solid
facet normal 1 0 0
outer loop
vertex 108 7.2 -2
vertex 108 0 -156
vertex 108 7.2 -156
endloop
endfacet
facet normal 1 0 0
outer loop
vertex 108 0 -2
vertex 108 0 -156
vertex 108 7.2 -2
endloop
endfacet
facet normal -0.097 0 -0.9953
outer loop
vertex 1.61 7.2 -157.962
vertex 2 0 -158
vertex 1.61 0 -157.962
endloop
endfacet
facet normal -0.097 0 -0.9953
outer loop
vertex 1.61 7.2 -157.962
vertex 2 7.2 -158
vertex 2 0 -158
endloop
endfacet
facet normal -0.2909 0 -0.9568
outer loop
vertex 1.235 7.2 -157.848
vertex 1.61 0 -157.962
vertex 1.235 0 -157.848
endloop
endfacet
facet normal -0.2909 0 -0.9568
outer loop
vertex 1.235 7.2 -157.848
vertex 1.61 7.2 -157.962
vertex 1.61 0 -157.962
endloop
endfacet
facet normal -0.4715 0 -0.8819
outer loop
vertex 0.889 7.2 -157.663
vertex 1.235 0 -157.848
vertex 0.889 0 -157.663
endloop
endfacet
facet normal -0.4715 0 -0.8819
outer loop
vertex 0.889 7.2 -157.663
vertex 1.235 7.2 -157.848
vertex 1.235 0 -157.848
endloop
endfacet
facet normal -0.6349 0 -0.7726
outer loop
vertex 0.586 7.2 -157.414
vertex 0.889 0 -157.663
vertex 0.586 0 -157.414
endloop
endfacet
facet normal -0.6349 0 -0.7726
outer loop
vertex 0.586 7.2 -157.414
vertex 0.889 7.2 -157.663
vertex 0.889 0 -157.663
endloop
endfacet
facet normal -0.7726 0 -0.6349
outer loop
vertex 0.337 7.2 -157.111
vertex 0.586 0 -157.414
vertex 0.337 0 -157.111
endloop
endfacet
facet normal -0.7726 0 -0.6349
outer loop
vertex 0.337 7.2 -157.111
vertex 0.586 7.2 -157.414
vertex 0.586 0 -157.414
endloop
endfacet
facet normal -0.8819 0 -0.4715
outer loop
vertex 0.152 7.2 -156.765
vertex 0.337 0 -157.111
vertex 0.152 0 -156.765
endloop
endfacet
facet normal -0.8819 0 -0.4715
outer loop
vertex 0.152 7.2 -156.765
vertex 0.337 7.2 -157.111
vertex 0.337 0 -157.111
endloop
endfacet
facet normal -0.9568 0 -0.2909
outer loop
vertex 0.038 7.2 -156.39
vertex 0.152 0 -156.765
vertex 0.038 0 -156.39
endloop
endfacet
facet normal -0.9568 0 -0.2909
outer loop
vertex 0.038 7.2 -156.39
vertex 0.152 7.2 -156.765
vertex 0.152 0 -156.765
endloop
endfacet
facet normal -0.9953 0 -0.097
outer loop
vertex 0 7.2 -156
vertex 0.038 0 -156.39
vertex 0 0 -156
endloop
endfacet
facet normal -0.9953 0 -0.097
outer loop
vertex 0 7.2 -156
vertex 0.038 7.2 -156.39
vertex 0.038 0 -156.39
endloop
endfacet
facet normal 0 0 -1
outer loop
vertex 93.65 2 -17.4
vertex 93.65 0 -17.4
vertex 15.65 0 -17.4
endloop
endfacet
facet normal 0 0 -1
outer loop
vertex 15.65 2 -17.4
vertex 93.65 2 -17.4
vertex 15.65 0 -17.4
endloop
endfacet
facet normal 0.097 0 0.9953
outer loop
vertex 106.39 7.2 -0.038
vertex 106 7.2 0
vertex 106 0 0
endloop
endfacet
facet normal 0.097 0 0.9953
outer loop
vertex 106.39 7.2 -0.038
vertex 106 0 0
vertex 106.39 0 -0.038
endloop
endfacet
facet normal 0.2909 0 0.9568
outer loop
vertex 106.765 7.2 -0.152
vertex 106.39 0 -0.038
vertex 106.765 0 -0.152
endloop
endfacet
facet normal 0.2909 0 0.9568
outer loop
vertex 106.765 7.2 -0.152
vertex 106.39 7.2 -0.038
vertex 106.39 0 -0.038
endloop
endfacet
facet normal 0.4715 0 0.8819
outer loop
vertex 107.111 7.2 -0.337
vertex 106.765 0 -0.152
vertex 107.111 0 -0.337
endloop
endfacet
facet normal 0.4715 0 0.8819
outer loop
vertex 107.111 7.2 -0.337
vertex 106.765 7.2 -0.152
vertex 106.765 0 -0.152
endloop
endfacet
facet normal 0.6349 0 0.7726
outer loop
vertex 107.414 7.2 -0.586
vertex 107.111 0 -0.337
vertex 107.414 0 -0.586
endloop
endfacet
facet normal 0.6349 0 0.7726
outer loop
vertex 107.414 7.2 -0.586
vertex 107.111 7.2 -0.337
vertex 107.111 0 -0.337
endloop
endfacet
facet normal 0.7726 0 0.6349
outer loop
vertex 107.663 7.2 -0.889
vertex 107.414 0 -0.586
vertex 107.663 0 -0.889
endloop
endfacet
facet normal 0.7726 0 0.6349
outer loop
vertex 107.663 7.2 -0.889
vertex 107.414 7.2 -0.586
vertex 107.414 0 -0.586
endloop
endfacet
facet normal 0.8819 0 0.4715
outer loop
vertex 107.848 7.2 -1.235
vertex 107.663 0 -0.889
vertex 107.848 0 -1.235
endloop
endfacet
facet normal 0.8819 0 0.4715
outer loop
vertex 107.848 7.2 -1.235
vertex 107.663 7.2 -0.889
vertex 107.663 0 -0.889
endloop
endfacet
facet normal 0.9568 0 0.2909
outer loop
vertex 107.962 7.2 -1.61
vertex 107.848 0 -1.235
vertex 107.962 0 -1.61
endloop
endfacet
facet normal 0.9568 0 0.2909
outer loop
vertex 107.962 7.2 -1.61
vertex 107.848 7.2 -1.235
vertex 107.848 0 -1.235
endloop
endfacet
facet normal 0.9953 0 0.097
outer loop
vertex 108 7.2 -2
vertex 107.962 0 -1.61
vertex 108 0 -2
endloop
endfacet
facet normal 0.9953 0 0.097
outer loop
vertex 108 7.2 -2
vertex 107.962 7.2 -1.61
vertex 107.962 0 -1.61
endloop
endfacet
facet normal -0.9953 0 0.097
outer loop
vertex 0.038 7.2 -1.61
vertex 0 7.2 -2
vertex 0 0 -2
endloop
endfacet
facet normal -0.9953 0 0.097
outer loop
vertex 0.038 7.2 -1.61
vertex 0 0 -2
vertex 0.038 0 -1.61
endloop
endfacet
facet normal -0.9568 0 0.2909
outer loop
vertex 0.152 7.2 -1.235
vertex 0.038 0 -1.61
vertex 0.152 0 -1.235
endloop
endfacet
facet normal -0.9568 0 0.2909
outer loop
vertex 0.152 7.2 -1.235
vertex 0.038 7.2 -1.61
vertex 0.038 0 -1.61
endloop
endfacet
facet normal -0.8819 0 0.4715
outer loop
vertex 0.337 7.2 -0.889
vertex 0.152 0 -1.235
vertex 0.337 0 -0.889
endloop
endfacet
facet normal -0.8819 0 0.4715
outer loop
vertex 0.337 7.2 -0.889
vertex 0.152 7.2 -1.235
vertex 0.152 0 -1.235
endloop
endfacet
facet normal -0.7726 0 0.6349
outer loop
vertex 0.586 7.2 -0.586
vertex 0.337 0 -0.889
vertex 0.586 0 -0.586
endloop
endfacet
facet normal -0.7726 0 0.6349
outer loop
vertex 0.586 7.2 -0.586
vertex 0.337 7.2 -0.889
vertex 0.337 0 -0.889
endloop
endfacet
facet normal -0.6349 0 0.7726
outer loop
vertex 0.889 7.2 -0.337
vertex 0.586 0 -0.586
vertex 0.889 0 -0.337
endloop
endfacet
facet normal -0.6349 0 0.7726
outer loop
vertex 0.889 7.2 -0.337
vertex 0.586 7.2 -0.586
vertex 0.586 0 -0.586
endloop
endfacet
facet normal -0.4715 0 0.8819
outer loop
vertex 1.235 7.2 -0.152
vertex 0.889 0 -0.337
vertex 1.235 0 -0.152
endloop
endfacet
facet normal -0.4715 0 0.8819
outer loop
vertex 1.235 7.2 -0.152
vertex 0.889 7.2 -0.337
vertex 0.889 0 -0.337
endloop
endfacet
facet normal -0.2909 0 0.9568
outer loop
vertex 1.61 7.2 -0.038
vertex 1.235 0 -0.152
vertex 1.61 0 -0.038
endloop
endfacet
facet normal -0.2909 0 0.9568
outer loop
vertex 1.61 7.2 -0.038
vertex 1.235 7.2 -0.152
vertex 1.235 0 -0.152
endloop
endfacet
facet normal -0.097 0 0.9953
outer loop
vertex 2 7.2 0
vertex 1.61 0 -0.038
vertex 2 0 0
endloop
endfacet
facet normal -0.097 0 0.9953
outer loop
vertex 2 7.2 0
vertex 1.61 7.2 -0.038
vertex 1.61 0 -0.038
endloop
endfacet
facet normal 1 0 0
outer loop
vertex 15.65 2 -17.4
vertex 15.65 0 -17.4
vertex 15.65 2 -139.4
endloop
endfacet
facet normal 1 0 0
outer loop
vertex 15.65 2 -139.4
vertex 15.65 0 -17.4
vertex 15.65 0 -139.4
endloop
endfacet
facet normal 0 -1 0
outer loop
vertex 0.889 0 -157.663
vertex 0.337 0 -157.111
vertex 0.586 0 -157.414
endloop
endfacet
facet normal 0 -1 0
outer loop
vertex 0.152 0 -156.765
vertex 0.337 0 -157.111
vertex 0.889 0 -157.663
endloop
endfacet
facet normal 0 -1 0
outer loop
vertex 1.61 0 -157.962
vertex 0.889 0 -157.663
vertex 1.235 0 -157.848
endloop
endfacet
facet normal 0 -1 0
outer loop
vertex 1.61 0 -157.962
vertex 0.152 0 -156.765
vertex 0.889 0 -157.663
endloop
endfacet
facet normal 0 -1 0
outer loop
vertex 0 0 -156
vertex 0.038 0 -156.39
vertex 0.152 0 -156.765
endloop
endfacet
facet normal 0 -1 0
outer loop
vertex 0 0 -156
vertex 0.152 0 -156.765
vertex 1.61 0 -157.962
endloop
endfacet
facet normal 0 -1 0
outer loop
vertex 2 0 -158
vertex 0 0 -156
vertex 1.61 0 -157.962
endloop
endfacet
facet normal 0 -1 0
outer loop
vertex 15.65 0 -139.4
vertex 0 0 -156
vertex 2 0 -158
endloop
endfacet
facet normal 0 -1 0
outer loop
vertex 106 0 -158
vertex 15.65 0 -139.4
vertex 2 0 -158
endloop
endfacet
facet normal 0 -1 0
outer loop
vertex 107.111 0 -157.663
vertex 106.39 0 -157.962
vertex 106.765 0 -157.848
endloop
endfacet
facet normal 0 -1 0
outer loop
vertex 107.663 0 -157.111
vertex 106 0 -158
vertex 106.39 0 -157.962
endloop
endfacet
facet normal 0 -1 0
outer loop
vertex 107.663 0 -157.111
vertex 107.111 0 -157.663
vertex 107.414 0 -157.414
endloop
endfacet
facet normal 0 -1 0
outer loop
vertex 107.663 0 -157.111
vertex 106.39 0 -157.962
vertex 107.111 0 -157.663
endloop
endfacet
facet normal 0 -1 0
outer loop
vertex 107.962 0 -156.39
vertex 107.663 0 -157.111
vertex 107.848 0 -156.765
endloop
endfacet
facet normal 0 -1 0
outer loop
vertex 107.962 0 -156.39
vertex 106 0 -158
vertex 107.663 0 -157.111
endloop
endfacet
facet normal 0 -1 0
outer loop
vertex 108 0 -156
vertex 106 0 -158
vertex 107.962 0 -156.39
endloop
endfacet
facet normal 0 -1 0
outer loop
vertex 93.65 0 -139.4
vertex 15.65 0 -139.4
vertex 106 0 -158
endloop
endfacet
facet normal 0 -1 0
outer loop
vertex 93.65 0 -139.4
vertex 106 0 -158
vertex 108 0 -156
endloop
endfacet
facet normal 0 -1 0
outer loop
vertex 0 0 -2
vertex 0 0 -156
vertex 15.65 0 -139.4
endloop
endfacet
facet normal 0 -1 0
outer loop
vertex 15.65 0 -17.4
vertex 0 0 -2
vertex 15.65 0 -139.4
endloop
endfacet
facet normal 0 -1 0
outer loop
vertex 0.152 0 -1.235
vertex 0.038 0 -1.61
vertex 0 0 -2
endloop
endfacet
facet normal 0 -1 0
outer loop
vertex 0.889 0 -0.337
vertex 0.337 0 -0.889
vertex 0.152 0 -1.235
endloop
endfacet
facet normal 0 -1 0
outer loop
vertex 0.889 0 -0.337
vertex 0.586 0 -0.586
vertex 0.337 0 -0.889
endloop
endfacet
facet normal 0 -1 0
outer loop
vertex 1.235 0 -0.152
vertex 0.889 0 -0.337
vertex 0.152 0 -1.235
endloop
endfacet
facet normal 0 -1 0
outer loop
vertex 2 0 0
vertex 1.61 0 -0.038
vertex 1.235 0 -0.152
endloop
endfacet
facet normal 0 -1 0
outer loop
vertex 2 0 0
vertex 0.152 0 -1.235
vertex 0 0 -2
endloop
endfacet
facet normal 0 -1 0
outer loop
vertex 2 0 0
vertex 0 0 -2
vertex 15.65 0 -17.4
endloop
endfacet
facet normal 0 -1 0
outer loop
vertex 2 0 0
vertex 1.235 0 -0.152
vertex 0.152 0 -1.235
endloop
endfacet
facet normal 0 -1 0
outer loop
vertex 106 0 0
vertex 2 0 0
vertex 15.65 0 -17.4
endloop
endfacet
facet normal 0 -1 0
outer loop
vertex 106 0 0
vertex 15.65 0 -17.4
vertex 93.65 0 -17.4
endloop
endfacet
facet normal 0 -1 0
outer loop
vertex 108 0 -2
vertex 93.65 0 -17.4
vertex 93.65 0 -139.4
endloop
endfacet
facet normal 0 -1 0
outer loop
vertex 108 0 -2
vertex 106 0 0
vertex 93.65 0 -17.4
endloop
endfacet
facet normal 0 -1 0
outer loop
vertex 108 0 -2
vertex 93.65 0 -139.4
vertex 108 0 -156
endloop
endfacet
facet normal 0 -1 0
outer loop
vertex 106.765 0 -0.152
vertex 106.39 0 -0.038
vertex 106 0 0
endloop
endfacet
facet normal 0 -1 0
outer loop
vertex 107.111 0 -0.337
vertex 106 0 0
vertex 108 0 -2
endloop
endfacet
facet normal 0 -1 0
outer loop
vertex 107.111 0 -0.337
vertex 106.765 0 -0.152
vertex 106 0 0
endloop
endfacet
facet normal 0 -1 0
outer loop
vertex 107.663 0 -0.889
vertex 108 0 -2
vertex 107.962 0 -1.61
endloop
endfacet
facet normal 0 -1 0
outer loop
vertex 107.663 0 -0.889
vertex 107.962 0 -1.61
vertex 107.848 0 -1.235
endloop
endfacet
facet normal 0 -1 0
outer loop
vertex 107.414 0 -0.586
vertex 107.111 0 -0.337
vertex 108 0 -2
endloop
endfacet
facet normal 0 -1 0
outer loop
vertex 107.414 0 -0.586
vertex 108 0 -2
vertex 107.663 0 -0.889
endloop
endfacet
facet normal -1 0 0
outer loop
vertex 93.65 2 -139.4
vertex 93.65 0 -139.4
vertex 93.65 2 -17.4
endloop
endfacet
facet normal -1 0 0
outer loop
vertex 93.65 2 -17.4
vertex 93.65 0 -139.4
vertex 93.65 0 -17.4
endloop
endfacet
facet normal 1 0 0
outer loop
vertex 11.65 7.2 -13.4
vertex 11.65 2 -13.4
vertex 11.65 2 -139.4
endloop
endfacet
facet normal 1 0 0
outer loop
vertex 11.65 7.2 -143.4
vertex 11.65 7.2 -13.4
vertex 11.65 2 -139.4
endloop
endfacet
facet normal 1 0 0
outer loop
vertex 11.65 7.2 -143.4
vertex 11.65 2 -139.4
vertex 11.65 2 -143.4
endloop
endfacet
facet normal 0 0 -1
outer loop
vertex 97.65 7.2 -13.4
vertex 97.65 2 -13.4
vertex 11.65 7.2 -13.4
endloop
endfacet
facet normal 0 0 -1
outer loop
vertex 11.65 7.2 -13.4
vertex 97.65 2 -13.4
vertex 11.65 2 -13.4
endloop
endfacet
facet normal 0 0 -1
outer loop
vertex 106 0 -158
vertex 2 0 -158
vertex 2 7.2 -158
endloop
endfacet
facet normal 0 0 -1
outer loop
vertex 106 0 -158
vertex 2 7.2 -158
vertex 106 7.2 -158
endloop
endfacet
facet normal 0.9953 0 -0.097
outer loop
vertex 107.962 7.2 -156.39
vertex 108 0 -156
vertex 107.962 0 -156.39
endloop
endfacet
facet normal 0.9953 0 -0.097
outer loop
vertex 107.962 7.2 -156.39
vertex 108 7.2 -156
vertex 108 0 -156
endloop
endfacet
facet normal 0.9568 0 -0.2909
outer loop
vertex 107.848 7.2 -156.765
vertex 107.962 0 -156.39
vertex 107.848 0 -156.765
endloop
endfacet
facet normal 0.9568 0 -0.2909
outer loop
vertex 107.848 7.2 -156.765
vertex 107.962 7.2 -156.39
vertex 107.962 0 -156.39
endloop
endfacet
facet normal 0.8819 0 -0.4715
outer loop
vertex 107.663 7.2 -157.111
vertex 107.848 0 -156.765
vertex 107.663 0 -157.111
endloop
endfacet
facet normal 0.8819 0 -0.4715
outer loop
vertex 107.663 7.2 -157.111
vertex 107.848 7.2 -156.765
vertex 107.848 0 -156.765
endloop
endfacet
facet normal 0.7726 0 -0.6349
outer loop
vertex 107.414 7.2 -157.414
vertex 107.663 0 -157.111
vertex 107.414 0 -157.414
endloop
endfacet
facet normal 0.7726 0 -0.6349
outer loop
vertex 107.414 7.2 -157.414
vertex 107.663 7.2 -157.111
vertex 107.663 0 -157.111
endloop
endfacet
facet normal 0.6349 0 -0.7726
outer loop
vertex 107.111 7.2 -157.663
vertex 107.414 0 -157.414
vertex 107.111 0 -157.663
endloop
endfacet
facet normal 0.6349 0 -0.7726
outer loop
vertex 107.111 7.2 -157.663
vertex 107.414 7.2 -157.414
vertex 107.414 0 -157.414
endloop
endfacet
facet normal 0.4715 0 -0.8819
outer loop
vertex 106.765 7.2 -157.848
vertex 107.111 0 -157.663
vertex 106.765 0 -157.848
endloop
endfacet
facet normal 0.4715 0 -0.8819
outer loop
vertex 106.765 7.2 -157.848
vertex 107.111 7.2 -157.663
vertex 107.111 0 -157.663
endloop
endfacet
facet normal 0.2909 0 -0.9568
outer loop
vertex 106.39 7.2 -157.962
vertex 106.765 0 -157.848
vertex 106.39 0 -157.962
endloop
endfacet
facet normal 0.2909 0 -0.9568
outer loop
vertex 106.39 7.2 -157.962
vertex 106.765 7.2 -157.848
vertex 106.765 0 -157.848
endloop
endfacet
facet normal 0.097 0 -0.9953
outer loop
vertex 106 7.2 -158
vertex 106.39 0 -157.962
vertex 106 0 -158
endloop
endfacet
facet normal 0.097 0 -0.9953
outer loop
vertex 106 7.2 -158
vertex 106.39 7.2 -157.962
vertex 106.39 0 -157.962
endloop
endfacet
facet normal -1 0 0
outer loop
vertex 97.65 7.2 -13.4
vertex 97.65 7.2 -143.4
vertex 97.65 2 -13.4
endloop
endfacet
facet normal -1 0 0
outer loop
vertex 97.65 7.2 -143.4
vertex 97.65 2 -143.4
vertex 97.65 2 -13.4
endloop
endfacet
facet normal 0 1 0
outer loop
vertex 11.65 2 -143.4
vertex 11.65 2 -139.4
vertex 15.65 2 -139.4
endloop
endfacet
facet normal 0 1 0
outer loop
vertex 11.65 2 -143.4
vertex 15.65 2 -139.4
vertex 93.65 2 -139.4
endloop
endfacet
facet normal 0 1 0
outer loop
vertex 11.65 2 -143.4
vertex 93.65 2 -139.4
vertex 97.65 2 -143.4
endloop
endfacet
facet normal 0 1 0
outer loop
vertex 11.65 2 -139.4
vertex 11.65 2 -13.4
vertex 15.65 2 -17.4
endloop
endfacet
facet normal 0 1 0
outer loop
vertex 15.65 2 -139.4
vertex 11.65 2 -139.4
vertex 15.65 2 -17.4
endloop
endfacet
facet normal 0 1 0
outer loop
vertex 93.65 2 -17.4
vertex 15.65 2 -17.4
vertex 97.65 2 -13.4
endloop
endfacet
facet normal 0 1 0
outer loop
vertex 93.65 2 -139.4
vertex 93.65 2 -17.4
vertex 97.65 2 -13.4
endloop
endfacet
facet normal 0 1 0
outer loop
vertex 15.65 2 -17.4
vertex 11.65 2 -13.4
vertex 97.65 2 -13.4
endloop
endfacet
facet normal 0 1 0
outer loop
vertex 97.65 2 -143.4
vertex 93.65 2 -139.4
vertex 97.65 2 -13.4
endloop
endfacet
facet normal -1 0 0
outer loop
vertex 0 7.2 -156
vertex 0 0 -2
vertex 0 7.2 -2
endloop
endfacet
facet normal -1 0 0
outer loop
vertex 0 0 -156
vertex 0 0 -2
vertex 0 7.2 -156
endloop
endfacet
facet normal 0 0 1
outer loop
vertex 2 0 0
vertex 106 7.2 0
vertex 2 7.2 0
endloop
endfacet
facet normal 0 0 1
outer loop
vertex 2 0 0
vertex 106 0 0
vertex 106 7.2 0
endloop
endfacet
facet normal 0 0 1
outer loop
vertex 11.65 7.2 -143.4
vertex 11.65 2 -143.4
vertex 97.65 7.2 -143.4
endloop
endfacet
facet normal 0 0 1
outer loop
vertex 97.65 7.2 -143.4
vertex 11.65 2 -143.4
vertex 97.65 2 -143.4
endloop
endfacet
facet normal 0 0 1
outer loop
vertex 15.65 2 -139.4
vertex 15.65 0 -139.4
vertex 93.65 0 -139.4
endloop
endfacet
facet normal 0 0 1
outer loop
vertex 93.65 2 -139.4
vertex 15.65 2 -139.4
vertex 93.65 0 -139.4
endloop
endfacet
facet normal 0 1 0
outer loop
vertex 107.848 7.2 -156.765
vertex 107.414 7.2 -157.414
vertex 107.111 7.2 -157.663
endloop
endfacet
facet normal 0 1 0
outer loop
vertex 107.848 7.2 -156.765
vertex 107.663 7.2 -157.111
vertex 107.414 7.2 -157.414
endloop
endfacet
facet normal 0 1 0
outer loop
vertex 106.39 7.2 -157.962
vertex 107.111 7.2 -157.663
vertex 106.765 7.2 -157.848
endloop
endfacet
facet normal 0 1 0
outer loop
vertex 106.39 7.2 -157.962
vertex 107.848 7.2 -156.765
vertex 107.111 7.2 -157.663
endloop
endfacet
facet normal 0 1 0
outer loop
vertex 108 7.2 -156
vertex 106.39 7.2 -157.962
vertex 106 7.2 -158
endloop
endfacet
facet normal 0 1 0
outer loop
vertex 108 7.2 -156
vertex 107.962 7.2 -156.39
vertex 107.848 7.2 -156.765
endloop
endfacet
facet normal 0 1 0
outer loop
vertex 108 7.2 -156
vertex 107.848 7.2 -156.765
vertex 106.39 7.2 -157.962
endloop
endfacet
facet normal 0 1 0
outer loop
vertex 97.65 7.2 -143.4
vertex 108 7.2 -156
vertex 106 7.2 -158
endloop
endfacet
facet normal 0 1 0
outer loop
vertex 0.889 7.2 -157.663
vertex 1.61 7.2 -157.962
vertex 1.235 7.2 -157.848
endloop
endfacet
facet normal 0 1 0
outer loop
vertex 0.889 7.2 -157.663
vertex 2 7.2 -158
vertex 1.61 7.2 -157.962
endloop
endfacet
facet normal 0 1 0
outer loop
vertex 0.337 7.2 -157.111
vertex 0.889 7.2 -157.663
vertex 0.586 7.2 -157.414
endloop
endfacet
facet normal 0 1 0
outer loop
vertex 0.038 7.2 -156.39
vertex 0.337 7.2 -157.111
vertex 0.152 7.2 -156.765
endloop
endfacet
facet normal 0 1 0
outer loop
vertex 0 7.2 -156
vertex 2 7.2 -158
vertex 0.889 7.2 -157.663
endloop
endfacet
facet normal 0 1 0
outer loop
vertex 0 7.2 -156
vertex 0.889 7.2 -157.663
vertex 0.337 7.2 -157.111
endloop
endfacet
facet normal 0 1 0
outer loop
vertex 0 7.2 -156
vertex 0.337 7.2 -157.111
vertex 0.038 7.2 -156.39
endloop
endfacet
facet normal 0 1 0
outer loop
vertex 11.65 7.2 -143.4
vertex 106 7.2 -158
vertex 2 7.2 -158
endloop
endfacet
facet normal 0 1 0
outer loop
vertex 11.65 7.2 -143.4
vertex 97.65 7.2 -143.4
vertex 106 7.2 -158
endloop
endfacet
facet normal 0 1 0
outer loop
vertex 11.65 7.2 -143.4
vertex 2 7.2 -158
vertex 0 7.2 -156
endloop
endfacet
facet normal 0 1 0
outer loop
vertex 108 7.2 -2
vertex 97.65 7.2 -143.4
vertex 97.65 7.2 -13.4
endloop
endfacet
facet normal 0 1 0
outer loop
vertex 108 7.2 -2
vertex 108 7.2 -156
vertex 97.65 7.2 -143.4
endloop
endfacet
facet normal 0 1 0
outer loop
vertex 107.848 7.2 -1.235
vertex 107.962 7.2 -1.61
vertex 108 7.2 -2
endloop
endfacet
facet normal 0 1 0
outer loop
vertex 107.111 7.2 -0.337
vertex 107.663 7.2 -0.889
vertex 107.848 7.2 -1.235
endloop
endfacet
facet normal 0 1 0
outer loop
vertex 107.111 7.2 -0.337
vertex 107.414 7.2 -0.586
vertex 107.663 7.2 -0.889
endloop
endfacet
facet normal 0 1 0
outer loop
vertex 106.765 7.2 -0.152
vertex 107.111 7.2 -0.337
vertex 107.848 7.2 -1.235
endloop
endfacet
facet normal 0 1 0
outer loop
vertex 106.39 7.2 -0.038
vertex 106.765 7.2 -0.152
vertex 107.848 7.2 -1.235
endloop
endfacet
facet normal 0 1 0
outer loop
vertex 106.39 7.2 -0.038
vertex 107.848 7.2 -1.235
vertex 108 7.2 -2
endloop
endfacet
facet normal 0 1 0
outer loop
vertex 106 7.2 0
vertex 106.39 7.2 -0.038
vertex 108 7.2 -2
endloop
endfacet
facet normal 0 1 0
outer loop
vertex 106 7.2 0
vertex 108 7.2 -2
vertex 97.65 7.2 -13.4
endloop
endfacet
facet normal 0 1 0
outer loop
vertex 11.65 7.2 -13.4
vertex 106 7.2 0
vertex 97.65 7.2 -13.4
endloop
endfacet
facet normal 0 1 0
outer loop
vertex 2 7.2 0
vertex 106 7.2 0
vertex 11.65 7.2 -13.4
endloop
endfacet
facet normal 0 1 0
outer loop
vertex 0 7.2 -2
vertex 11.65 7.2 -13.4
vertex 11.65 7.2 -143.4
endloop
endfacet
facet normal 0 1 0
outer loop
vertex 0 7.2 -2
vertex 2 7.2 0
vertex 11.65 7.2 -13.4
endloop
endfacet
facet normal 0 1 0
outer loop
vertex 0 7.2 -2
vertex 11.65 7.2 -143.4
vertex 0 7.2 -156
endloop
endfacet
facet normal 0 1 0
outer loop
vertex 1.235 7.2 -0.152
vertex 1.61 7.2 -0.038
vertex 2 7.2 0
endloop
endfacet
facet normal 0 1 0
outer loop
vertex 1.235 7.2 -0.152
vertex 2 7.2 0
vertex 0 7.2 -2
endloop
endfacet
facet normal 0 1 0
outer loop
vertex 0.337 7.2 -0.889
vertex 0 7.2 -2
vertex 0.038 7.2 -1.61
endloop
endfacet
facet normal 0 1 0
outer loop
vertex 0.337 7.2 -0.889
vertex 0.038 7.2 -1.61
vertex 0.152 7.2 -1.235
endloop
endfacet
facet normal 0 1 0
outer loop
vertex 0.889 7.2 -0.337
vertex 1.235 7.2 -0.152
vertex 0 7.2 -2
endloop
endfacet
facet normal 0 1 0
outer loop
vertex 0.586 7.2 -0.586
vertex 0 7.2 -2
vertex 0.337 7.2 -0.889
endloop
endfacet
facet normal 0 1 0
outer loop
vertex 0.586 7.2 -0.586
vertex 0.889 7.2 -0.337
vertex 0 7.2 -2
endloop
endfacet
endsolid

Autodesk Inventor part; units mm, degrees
ref_plane "YZ Plane" through (0, 0, 0) normal (1, 0, 0) x (0, 1, 0)
ref_plane "XZ Plane" through (0, 0, 0) normal (0, 1, 0) x (-1, 0, 0)
ref_plane "XY Plane" through (0, 0, 0) normal (0, 0, 1) x (1, 0, 0)
sketch "草图1" plane through (0, 0, 0) normal (0, 1, 0) x (-1, 0, 0)
  line L0 (0, 0) -> (0, -158)
  line L1 (0, -158) -> (-108, -158)
  line L2 (-108, -158) -> (-108, 0)
  line L3 (-108, 0) -> (0, 0)
  line L4 (-54.65, -78.4) -> (-11.65, -78.4)
  line L5 (-11.65, -78.4) -> (-11.65, -143.4)
  line L6 (-11.65, -143.4) -> (-97.65, -143.4)
  line L7 (-97.65, -143.4) -> (-97.65, -13.4)
  line L8 (-97.65, -13.4) -> (-11.65, -13.4)
  line L9 (-11.65, -13.4) -> (-11.65, -78.4)
  dimension "d0" = 158
  dimension "d1" = 108
  dimension "d2" = 43
  dimension "d4" = 65
  dimension "d5" = 86
  dimension "d6" = 130
extrude "拉伸1" add sketch "草图1" along normal blind 7.2
fillet "圆角1" radius 2 4 edges at (108, 3.6, 0) (108, 3.6, -158) (0, 3.6, 0) (0, 3.6, -158)
sketch "草图2" plane through (0, 0, 0) normal (0, -1, 0) x (1, 0, 0)
  line L0 (11.65, -143.4) -> (97.65, -143.4) projected
  line L1 (11.65, -143.4) -> (11.65, -139.4)
  line L2 (11.65, -13.4) -> (11.65, -143.4) projected
  line L3 (11.65, -139.4) -> (15.65, -139.4)
  line L4 (15.65, -139.4) -> (93.65, -139.4)
  line L5 (93.65, -139.4) -> (93.65, -17.4)
  line L6 (93.65, -17.4) -> (15.65, -17.4)
  line L7 (15.65, -17.4) -> (15.65, -139.4)
  line L8 (97.65, -13.4) -> (11.65, -13.4) projected
  line L9 (11.65, -143.4) -> (97.65, -143.4)
  line L10 (97.65, -143.4) -> (97.65, -13.4)
  line L11 (97.65, -13.4) -> (11.65, -13.4)
  line L12 (11.65, -13.4) -> (11.65, -143.4)
  point P0 (0, 0)
  point P1 (97.65, -143.4)
  dimension "d10" = 4
  dimension "d11" = 4
  dimension "d12" = 78
  dimension "d13" = 122
extrude "拉伸2" add sketch "草图2" against normal blind 2
equation "\"折弯半径\" = 厚度"
equation "\"折弯释压宽度\" = 厚度"
equation "\"折弯释压深度\" = 0.5 * 厚度"
equation "\"拐角释压尺寸\" = 4 * 厚度"
equation "\"最小余量\" = 2 * 厚度"
equation "\"过渡半径\" = 折弯半径"
equation "\"Jacobi半径尺寸\" = 折弯半径"
equation "\"间隙大小\" = 厚度"
equation "\"厚度\" = 0.5"
properties part number "plate-holder"
